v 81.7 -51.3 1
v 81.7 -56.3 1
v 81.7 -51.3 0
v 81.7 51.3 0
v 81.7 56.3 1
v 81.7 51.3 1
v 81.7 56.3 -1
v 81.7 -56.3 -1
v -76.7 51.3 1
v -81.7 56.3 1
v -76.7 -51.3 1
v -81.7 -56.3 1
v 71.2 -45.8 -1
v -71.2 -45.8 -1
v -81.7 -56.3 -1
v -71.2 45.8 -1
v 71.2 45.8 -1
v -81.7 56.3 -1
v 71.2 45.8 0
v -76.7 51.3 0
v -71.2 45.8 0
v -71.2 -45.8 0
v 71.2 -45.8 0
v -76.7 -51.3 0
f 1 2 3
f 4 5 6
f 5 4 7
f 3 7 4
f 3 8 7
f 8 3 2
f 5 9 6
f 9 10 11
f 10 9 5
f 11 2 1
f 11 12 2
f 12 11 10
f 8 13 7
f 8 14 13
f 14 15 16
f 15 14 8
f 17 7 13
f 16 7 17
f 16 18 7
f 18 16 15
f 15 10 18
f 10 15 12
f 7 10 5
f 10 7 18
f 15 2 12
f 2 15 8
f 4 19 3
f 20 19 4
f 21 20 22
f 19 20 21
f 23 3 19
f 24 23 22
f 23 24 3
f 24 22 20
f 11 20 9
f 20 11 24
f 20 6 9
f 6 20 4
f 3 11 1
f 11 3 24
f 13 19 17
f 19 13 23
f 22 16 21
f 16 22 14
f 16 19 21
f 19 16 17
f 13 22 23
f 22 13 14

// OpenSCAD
// file: ../gospel.scad
/**
 * GOSPEL: George's OpenSCAD Procedural Enhancement Library
 * @author glaza
 *
 * Index:
 *      Translation: x, y, z, xy, xz, yz, xyz (displacement, variation)
 *      Scaling:     sx, sy, sz, sxy, sxz, syz, s (factor, variation)
 *      Rotation:    rx, ry, rz (angle, variation)
 *      Duplication: dx, dy, dz ()
 */

/**
 * Translates the children in the X,Y,Z direction
 * @param d Displacement in X,Y,Z direction
 * @param variation The random variation + or - added to the displacement * 
 *  x      Translate X
 *  y      Translate Y
 *  z      Translate Z
 *  xy     Translate equaly in X and Y
 *  xz     Translate equaly in X and Z
 *  yz     Translate equaly in Y and Z
 *  xyz    Translate equaly in X, Y and Z
 */
module x(dx, variation=0) 
{   
    vx = rands(-variation,variation,1)[0];
    translate([dx+vx,0,0])
    children();
}
module y(dy, variation=0) 
{   
    vy = rands(-variation,variation,1)[0];
    translate([0,dy+vy,0])
    children();
} 
module z(dz, variation=0) 
{   
    vz = rands(-variation,variation,1)[0];
    translate([0,0,dz+vz])
    children();
}
module xy(d, variation=0) 
{   
    x(d, variation)
    y(d, variation)
    children();
}
module yz(d, variation=0) 
{   
    z(d, variation)
    y(d, variation)
    children();
}
module xz(d, variation=0) 
{   
    x(d, variation)
    z(d, variation)
    children();
}
module xyz(d, variation=0) 
{   
    xy(d, variation)
    z(d, variation)
    children();
}

/**
 * Rotates the children around the X axis
 * @param angle Degrees to rotate around the X axis
 * @param variation The random variation + or - added
 *  rx     Rotate around X
 *  ry     Rotate around Y
 *  rz     Rotate around Z
 */
module rx(angle, variation=0) 
{   
    v = rands(-variation,variation,1)[0];
    rotate([angle+v,0,0])
    children();
}
module ry(angle, variation=0) 
{   
    v = rands(-variation,variation,1)[0];
    rotate([0,angle+v,0,0])
    children();
}
module rz(angle, variation=0) 
{   
    v = rands(-variation,variation,1)[0];
    rotate([0,0,angle+v])
    children();
}

/**
 * Duplicates the children across the different planes.
 *      dx: YZ plane, dy: XZ plane, dz: XY plane
 */
module dx() 
{
    mirror([1,0,0])
    children();

    children();
}
module dy() 
{
    mirror([0,1,0])
    children();

    children();
}
module dz() 
{
    mirror([0,0,1])
    children();

    children();
}

/**
 * Mirrors across diferent planes.
 *      mx: YZ plane, my: XZ plane, mz: XY plane
 */
module mx() 
{
    mirror([1,0,0])
    children();
}
module my() 
{
    mirror([0,1,0])
    children();
}
module mz() 
{
    mirror([0,0,1])
    children();
}

/**
 * Scales in different directions
 *      mx: YZ plane, my: XZ plane, mz: XY plane
 */
module sx(factor, variation=0) 
{   
    v = rands(-variation,variation,1)[0];
    scale([factor+v,1,1])
    children();
}
module sy(factor, variation=0) 
{   
    v = rands(-variation,variation,1)[0];
    scale([1,factor+v,1])
    children();
} 
module sz(factor, variation=0) 
{   
    v = rands(-variation,variation,1)[0];
    scale([1,1,factor+v])
    children();
}
module sxy(factor, variation=0) 
{   
    sx(factor, variation)
    sy(factor, variation)
    children();
}
module syz(factor, variation=0) 
{   
    sz(factor, variation)
    sy(factor, variation)
    children();
}
module sxz(factor, variation=0) 
{   
    sx(factor, variation)
    sz(factor, variation)
    children();
}
module s(factor, variation=0) 
{   
    sxy(factor, variation)
    sz(factor, variation)
    children();
}

/**
 * Shortcuts
 */
module diff() //does not work
{
    difference()
    {
        children();
    }
}


/**
 * Colours
 */
module red()
{
    color("Red")
    children();
}
module blue()
{
    color("RoyalBlue")
    children();
}
module black()
{
    color("Black")
    children();
}
module white()
{
    color("White")
    children();
}
// main file
include <../gospel.scad>

thickness = 2;
margin = 10;
tollerance = 1;

photo_x = 6 * 25.4;
photo_y = 4 * 25.4;
slot_x = photo_x + tollerance;
slot_y = photo_y + tollerance;
frame_x = photo_x + margin + tollerance;
frame_y = photo_y + margin + tollerance;
cutout_x = photo_x - margin;
cutout_y = photo_y - margin;

pictureHolderVertical();

module pictureHolderHorizontal() {
    difference() {
        cube([frame_x, frame_y, thickness], center=true);
        
        y(margin/2) z(thickness/2) 
        cube([slot_x, slot_y + margin, thickness], center=true);
        
        cube([cutout_x, cutout_y, thickness], center=true);
    }
}

module pictureHolderVertical() {
    difference() {
        cube([frame_x, frame_y, thickness], center=true);
        
        x (margin/2) z(thickness/2) 
        cube([slot_x + margin, slot_y, thickness], center=true);
        
        cube([cutout_x, cutout_y, thickness], center=true);
    }
}
